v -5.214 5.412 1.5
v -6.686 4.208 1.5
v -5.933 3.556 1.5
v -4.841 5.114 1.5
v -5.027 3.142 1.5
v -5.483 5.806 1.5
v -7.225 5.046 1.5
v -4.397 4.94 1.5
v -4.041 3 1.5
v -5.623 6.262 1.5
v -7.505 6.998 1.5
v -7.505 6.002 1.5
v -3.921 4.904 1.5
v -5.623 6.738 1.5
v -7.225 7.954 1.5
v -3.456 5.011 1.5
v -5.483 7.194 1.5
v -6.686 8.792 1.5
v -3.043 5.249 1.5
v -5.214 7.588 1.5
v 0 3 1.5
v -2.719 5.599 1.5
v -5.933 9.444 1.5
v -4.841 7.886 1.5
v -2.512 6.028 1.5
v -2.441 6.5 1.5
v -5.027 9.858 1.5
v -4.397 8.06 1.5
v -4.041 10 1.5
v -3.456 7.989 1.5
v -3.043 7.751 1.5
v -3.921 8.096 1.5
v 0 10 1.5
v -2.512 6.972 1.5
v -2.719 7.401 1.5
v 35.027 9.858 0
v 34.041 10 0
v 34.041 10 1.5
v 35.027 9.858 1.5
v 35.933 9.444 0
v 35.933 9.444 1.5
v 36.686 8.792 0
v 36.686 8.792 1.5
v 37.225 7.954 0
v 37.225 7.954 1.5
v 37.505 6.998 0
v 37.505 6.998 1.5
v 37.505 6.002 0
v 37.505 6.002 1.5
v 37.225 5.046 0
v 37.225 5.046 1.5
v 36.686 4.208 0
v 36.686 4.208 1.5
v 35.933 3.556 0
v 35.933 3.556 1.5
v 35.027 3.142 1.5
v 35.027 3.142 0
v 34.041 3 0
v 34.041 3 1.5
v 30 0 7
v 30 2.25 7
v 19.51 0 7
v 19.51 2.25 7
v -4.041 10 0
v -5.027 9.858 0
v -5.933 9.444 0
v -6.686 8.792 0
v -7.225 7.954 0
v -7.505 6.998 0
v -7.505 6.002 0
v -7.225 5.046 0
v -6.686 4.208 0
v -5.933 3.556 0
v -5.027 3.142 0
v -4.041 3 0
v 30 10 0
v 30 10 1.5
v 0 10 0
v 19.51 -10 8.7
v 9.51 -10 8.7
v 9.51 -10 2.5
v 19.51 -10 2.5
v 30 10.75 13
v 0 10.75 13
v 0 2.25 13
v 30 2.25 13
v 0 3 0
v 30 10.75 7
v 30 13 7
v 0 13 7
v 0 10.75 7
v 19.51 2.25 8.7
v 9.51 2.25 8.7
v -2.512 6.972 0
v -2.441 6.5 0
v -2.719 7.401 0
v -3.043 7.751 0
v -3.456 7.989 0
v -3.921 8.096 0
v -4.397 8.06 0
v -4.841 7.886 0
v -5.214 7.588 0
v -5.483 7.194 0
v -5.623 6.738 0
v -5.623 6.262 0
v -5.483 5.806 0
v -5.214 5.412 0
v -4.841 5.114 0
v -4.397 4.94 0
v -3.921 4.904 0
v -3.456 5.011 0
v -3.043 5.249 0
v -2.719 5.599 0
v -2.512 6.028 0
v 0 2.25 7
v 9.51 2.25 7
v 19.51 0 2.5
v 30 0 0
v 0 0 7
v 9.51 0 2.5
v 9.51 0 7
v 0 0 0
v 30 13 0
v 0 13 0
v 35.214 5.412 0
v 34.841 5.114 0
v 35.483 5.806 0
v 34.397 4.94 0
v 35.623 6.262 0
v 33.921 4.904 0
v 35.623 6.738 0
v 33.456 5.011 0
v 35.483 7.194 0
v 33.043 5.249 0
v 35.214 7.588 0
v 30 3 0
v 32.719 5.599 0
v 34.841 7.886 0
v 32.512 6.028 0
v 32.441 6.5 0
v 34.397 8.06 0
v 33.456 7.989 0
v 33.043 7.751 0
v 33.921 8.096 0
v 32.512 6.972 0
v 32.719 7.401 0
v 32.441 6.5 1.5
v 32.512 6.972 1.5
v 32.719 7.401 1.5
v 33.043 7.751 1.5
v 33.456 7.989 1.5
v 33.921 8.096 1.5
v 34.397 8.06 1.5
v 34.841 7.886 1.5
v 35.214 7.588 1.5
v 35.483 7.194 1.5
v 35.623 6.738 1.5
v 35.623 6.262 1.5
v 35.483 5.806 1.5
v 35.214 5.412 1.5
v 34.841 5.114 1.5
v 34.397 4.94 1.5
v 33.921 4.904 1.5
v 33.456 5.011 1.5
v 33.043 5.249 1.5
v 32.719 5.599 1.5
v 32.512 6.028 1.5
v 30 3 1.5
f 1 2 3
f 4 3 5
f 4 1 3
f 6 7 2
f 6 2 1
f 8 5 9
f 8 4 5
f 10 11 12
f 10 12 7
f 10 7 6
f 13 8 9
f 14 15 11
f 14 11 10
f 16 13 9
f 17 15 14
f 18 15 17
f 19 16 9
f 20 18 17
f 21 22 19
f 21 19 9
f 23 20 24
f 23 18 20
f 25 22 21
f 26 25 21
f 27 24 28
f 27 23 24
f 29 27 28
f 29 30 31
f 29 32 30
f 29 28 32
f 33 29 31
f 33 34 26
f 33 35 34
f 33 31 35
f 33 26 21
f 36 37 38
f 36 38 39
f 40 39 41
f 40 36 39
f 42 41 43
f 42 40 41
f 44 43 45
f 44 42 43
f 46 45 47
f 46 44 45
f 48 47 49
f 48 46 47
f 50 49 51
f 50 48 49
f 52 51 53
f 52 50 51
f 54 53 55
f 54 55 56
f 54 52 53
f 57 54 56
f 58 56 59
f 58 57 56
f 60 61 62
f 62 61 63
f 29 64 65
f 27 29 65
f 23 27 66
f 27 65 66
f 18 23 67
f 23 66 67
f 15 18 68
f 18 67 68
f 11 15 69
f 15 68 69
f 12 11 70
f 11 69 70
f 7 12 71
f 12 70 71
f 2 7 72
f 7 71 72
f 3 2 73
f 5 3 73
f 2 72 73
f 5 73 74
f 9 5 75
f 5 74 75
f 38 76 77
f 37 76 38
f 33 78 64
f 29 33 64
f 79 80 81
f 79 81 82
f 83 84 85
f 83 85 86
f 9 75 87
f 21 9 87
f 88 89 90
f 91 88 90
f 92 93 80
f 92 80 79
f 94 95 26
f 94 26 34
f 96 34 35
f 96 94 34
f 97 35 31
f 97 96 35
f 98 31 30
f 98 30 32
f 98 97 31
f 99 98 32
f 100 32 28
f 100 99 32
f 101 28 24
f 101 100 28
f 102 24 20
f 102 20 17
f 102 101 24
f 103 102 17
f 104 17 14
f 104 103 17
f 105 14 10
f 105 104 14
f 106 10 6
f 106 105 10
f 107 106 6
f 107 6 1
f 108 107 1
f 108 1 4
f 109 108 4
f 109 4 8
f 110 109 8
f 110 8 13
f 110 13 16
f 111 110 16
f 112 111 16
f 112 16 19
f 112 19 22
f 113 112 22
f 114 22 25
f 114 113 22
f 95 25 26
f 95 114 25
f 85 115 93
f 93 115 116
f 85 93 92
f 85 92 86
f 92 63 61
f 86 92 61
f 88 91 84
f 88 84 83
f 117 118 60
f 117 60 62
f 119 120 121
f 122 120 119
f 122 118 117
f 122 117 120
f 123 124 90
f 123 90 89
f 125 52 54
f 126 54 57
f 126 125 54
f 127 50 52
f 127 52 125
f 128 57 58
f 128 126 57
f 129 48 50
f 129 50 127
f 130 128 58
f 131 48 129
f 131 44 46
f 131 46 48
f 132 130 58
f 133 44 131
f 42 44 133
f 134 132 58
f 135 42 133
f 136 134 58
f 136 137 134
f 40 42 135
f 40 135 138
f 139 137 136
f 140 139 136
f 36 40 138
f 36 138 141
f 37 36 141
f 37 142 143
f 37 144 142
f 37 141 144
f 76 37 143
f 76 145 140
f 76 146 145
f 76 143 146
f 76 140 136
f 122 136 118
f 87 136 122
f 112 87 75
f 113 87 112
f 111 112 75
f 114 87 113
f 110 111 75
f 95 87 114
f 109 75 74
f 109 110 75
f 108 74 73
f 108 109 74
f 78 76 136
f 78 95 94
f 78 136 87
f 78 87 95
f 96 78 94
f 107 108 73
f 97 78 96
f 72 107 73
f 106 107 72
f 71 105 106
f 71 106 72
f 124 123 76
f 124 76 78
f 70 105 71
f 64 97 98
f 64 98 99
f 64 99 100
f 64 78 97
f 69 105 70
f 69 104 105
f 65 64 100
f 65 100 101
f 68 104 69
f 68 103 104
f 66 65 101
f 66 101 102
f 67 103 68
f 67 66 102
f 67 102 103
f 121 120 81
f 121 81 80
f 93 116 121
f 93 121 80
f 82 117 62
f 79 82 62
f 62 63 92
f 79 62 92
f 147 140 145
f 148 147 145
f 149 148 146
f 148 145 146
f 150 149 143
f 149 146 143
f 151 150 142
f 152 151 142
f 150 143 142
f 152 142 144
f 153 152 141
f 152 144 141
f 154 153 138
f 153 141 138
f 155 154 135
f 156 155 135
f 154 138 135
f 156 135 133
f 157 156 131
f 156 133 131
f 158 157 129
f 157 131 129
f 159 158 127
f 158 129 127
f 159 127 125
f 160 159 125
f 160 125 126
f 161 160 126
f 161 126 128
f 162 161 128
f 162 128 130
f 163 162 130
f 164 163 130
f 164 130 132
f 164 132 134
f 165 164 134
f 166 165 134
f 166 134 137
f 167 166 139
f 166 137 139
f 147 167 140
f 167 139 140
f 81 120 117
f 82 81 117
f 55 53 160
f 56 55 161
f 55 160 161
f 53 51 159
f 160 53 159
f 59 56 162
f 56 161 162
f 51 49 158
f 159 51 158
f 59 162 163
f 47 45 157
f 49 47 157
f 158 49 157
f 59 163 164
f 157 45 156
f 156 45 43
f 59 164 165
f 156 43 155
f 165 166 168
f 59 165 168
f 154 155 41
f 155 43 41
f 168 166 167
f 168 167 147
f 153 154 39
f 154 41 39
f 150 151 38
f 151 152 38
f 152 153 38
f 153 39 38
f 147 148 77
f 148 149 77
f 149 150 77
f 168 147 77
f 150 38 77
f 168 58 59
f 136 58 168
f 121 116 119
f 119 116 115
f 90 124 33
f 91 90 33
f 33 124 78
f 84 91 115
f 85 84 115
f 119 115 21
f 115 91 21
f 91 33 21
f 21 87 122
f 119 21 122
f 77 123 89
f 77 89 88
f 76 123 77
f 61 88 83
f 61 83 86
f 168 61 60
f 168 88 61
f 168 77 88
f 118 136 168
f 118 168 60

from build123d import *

# Parameters (mm, degrees)
BOSS_EXTRUDE1_DEPTH      = 7
SKETCH1_3_R              = 1.6
BOSS_EXTRUDE2_DEPTH      = 1.5
SKETCH2_W                = 30
SKETCH2_H                = 8.5
BOSS_EXTRUDE3_DEPTH      = 6
BOSS_EXTRUDE4_DEPTH      = 10
BOSS_EXTRUDE4_DEPTH_BACK = 6
SKETCH3_W                = 10
SKETCH3_H                = 6.2


with BuildPart() as part:
    # Sketch1 → Boss-Extrude1 (new body)
    with BuildSketch(Plane.XY):
        Polygon((0, 0), (15, 0), (15, 13), (0, 13), (0, 10), (0, 3), align=None)
    boss_extrude1 = extrude(amount=BOSS_EXTRUDE1_DEPTH)

    # Sketch1<3> → Boss-Extrude2 (add)
    with BuildSketch(Plane.XY):
        with BuildLine():
            Line((0, 10), (-4.041019256, 10))
            ThreePointArc((-4.041019256, 10), (-7.541019256, 6.5), (-4.041019256, 3))
            Line((-4.041019256, 3), (0, 3))
            Line((0, 3), (0, 10))
        make_face()
        with Locations((-4.041019256, 6.5)):
            Circle(SKETCH1_3_R, mode=Mode.SUBTRACT)
    boss_extrude2 = extrude(amount=BOSS_EXTRUDE2_DEPTH)

    # Mirror1: Boss-Extrude1, Boss-Extrude2 across plane
    add(boss_extrude1.mirror(Plane(origin=(15, -13.88108581, 7), x_dir=(0, 0, 1), z_dir=(-1, 0, 0))))
    add(boss_extrude2.mirror(Plane(origin=(15, -13.88108581, 7), x_dir=(0, 0, 1), z_dir=(-1, 0, 0))))

    # Sketch2 → Boss-Extrude3 (add)
    with BuildSketch(Plane.XY.offset(7)):
        with Locations((15, 6.5)):
            Rectangle(SKETCH2_W, SKETCH2_H)
    extrude(amount=BOSS_EXTRUDE3_DEPTH)

    # Sketch3 → Boss-Extrude4 (add, two sides: drawn at the far end of the back side and taken through both)
    with BuildSketch(Plane.XZ.offset(-BOSS_EXTRUDE4_DEPTH_BACK)):
        with Locations((14.510328708, 5.6)):
            Rectangle(SKETCH3_W, SKETCH3_H)
    extrude(amount=BOSS_EXTRUDE4_DEPTH + BOSS_EXTRUDE4_DEPTH_BACK)


solid = part.part
